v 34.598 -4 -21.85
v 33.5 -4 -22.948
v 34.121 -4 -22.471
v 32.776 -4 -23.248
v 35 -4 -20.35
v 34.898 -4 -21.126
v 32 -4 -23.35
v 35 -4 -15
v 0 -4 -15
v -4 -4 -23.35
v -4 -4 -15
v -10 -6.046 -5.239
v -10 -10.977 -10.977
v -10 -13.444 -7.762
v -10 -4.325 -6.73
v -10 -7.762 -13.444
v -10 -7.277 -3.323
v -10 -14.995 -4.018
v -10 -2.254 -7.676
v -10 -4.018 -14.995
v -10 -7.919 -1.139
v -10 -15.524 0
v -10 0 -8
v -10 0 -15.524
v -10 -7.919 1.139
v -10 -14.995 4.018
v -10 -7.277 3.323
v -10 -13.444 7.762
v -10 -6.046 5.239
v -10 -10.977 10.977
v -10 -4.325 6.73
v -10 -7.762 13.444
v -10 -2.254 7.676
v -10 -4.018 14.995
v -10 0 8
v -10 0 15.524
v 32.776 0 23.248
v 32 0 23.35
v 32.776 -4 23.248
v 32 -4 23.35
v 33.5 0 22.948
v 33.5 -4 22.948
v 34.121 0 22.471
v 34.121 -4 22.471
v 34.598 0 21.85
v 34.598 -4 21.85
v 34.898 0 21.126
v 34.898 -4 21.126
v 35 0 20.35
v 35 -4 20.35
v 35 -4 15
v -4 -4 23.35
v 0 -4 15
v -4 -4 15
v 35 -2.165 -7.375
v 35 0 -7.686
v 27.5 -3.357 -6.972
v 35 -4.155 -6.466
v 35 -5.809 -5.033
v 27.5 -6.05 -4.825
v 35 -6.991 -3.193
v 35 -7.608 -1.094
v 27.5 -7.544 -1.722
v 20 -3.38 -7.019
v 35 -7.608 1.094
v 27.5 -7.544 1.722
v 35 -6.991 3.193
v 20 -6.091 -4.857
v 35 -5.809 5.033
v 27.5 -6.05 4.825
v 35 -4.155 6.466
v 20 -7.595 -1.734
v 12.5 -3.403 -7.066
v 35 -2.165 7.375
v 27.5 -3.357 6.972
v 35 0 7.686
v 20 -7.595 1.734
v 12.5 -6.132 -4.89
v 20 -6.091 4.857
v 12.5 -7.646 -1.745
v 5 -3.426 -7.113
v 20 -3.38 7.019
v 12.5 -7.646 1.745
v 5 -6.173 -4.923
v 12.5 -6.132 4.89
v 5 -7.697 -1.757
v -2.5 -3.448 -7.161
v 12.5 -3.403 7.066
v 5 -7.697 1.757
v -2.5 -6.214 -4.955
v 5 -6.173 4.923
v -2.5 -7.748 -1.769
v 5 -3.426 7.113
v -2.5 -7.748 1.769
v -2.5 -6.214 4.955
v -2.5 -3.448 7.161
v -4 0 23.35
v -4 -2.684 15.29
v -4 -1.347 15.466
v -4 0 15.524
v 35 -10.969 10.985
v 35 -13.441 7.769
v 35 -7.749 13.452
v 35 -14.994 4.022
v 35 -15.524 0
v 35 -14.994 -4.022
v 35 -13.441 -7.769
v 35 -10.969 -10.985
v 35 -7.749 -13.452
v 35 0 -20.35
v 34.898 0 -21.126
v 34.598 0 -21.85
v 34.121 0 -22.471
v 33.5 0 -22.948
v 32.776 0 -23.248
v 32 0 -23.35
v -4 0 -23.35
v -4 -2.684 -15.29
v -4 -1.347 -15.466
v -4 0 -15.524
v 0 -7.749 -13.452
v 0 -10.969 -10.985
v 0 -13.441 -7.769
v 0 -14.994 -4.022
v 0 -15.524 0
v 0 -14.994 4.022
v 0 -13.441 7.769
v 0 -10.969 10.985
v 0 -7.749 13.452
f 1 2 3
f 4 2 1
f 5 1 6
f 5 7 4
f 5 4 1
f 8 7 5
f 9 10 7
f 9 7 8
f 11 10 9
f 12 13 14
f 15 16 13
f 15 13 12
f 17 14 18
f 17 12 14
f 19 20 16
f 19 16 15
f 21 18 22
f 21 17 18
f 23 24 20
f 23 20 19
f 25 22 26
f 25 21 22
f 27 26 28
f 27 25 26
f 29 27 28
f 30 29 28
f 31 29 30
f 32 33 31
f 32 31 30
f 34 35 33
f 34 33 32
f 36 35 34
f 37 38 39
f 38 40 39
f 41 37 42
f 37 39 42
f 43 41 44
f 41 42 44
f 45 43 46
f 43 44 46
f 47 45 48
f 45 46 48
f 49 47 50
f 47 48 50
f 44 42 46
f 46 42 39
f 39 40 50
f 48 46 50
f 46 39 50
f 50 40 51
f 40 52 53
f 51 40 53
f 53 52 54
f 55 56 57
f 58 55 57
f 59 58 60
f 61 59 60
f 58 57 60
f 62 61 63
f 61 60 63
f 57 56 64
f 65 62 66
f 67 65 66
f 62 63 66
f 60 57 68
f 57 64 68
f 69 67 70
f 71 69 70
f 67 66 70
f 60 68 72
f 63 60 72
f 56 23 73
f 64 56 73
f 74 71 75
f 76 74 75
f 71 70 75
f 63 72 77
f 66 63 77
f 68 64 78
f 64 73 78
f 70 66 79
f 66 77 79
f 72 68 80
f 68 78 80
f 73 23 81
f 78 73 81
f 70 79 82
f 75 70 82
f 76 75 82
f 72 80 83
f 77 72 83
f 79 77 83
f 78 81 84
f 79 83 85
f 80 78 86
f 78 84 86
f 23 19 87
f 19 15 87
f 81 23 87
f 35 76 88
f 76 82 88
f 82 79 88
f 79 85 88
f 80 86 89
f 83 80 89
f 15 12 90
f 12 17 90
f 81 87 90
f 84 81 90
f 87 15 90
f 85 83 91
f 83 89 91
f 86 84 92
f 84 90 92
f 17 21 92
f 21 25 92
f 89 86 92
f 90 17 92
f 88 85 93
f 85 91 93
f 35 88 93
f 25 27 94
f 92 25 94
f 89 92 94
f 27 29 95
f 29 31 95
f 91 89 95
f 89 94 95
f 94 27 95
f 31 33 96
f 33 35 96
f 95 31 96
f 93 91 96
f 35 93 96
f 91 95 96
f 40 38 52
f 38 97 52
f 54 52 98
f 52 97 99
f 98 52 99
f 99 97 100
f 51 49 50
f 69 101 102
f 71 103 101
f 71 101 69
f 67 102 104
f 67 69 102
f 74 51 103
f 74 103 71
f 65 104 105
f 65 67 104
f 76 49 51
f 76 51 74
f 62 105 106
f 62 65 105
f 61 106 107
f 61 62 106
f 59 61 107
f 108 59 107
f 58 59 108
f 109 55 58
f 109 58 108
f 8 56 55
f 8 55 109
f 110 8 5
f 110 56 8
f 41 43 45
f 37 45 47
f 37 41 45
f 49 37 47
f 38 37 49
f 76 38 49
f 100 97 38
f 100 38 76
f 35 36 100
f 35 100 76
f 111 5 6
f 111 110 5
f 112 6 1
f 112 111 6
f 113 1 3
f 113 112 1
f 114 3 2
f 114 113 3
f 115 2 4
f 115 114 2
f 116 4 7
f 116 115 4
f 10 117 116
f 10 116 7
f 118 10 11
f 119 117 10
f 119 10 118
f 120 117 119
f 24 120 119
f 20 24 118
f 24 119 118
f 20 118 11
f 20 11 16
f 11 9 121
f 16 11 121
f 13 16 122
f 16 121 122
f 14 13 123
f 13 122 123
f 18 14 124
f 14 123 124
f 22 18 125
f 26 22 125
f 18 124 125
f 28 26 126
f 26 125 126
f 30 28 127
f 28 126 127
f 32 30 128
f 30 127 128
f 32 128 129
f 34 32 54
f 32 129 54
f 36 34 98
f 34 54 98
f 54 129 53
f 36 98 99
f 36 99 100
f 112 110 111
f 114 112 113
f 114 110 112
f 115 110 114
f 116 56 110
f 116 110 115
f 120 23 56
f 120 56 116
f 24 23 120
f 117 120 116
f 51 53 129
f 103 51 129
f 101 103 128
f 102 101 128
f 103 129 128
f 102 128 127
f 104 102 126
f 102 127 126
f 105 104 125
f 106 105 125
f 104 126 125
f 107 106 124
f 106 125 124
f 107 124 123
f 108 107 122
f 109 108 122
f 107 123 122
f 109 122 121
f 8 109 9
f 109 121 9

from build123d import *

# Parameters (mm, degrees)
BOSS_EXTRUDE1_DEPTH = 35
BOSS_EXTRUDE2_START = 10
BOSS_EXTRUDE2_DEPTH = 10
FILLET1_R           = 3
FILLET3_R           = 3
BOSS_EXTRUDE3_START = 4
BOSS_EXTRUDE3_DEPTH = 4
SKETCH4_R           = 8
CUT_EXTRUDE7_DEPTH  = 54.020962835
CUT_EXTRUDE7_DRAFT  = -0.4


with BuildPart() as part:
    # Sketch1 → Boss-Extrude1 (new body)
    with BuildSketch(Plane(origin=(0, 0, 0), x_dir=(0, 0, -1), z_dir=(1, 0, 0))):
        with BuildLine():
            Line((-9, 0), (-16.35, 0))
            Line((-16.35, 0), (-23.35, 0))
            Line((-23.35, 0), (-23.35, -4))
            Line((-23.35, -4), (-15, -4))
            ThreePointArc((-15, -4), (0, -15.524174696), (15, -4))
            Line((15, -4), (23.35, -4))
            Line((23.35, -4), (23.35, 0))
            Line((23.35, 0), (16.35, 0))
            Line((16.35, 0), (9, 0))
            Line((9, 0), (-9, 0))
        make_face()
    extrude(amount=BOSS_EXTRUDE1_DEPTH)

    # Sketch2 → Boss-Extrude2 (add)
    with BuildSketch(Plane.ZY.offset(BOSS_EXTRUDE2_START)):
        with BuildLine():
            Line((0, 0), (-15.524174696, 0))
            ThreePointArc((-15.524174696, 0), (-15.392573216, -2.017099348), (-15, -4))
            ThreePointArc((-15, -4), (0, -15.524174696), (15, -4))
            ThreePointArc((15, -4), (15.392573216, -2.017099348), (15.524174696, 0))
            Line((15.524174696, 0), (0, 0))
        make_face()
    extrude(amount=-BOSS_EXTRUDE2_DEPTH)

    # Fillet1
    fillet1_edges = [part.edges().sort_by_distance(p)[0] for p in [
        (35, -2, 23.35),
    ]]
    fillet(fillet1_edges, radius=FILLET1_R)

    # Fillet3
    fillet3_edges = [part.edges().sort_by_distance(p)[0] for p in [
        (35, -2, -23.35),
    ]]
    fillet(fillet3_edges, radius=FILLET3_R)

    # Sketch3 → Boss-Extrude3 (add)
    with BuildSketch(Plane.ZY.offset(BOSS_EXTRUDE3_START)):
        with BuildLine():
            Line((-15.524174696, 0), (-23.35, 0))
            Line((-23.35, 0), (-23.35, -4))
            Line((-23.35, -4), (-15, -4))
            ThreePointArc((-15, -4), (-15.392573216, -2.017099348), (-15.524174696, 0))
        make_face()
        with BuildLine():
            Line((23.35, -4), (15, -4))
            ThreePointArc((15, -4), (15.392573216, -2.017099348), (15.524174696, 0))
            Line((15.524174696, 0), (23.35, 0))
            Line((23.35, 0), (23.35, -4))
        make_face()
    extrude(amount=-BOSS_EXTRUDE3_DEPTH)


with BuildPart() as cut_extrude7_tool:
    # Sketch4 → Cut-Extrude7 (with draft: the straight prism first)
    with BuildSketch(Plane.ZY.offset(10)):
        Circle(SKETCH4_R)
    extrude(amount=-CUT_EXTRUDE7_DEPTH)
    # Cut-Extrude7: the draft: its side faces are tilted about the plane it starts from
    cut_extrude7_sides = [cut_extrude7_tool.faces().sort_by_distance(p)[0] for p in [
        (17.010481418, 0, -8),
    ]]
    draft(cut_extrude7_sides, Plane.ZY.offset(10), CUT_EXTRUDE7_DRAFT)


with BuildPart() as part_1:
    add(part.part)

    # Cut-Extrude7: cut by cut_extrude7_tool
    add(cut_extrude7_tool.part, mode=Mode.SUBTRACT)


solid = part_1.part
